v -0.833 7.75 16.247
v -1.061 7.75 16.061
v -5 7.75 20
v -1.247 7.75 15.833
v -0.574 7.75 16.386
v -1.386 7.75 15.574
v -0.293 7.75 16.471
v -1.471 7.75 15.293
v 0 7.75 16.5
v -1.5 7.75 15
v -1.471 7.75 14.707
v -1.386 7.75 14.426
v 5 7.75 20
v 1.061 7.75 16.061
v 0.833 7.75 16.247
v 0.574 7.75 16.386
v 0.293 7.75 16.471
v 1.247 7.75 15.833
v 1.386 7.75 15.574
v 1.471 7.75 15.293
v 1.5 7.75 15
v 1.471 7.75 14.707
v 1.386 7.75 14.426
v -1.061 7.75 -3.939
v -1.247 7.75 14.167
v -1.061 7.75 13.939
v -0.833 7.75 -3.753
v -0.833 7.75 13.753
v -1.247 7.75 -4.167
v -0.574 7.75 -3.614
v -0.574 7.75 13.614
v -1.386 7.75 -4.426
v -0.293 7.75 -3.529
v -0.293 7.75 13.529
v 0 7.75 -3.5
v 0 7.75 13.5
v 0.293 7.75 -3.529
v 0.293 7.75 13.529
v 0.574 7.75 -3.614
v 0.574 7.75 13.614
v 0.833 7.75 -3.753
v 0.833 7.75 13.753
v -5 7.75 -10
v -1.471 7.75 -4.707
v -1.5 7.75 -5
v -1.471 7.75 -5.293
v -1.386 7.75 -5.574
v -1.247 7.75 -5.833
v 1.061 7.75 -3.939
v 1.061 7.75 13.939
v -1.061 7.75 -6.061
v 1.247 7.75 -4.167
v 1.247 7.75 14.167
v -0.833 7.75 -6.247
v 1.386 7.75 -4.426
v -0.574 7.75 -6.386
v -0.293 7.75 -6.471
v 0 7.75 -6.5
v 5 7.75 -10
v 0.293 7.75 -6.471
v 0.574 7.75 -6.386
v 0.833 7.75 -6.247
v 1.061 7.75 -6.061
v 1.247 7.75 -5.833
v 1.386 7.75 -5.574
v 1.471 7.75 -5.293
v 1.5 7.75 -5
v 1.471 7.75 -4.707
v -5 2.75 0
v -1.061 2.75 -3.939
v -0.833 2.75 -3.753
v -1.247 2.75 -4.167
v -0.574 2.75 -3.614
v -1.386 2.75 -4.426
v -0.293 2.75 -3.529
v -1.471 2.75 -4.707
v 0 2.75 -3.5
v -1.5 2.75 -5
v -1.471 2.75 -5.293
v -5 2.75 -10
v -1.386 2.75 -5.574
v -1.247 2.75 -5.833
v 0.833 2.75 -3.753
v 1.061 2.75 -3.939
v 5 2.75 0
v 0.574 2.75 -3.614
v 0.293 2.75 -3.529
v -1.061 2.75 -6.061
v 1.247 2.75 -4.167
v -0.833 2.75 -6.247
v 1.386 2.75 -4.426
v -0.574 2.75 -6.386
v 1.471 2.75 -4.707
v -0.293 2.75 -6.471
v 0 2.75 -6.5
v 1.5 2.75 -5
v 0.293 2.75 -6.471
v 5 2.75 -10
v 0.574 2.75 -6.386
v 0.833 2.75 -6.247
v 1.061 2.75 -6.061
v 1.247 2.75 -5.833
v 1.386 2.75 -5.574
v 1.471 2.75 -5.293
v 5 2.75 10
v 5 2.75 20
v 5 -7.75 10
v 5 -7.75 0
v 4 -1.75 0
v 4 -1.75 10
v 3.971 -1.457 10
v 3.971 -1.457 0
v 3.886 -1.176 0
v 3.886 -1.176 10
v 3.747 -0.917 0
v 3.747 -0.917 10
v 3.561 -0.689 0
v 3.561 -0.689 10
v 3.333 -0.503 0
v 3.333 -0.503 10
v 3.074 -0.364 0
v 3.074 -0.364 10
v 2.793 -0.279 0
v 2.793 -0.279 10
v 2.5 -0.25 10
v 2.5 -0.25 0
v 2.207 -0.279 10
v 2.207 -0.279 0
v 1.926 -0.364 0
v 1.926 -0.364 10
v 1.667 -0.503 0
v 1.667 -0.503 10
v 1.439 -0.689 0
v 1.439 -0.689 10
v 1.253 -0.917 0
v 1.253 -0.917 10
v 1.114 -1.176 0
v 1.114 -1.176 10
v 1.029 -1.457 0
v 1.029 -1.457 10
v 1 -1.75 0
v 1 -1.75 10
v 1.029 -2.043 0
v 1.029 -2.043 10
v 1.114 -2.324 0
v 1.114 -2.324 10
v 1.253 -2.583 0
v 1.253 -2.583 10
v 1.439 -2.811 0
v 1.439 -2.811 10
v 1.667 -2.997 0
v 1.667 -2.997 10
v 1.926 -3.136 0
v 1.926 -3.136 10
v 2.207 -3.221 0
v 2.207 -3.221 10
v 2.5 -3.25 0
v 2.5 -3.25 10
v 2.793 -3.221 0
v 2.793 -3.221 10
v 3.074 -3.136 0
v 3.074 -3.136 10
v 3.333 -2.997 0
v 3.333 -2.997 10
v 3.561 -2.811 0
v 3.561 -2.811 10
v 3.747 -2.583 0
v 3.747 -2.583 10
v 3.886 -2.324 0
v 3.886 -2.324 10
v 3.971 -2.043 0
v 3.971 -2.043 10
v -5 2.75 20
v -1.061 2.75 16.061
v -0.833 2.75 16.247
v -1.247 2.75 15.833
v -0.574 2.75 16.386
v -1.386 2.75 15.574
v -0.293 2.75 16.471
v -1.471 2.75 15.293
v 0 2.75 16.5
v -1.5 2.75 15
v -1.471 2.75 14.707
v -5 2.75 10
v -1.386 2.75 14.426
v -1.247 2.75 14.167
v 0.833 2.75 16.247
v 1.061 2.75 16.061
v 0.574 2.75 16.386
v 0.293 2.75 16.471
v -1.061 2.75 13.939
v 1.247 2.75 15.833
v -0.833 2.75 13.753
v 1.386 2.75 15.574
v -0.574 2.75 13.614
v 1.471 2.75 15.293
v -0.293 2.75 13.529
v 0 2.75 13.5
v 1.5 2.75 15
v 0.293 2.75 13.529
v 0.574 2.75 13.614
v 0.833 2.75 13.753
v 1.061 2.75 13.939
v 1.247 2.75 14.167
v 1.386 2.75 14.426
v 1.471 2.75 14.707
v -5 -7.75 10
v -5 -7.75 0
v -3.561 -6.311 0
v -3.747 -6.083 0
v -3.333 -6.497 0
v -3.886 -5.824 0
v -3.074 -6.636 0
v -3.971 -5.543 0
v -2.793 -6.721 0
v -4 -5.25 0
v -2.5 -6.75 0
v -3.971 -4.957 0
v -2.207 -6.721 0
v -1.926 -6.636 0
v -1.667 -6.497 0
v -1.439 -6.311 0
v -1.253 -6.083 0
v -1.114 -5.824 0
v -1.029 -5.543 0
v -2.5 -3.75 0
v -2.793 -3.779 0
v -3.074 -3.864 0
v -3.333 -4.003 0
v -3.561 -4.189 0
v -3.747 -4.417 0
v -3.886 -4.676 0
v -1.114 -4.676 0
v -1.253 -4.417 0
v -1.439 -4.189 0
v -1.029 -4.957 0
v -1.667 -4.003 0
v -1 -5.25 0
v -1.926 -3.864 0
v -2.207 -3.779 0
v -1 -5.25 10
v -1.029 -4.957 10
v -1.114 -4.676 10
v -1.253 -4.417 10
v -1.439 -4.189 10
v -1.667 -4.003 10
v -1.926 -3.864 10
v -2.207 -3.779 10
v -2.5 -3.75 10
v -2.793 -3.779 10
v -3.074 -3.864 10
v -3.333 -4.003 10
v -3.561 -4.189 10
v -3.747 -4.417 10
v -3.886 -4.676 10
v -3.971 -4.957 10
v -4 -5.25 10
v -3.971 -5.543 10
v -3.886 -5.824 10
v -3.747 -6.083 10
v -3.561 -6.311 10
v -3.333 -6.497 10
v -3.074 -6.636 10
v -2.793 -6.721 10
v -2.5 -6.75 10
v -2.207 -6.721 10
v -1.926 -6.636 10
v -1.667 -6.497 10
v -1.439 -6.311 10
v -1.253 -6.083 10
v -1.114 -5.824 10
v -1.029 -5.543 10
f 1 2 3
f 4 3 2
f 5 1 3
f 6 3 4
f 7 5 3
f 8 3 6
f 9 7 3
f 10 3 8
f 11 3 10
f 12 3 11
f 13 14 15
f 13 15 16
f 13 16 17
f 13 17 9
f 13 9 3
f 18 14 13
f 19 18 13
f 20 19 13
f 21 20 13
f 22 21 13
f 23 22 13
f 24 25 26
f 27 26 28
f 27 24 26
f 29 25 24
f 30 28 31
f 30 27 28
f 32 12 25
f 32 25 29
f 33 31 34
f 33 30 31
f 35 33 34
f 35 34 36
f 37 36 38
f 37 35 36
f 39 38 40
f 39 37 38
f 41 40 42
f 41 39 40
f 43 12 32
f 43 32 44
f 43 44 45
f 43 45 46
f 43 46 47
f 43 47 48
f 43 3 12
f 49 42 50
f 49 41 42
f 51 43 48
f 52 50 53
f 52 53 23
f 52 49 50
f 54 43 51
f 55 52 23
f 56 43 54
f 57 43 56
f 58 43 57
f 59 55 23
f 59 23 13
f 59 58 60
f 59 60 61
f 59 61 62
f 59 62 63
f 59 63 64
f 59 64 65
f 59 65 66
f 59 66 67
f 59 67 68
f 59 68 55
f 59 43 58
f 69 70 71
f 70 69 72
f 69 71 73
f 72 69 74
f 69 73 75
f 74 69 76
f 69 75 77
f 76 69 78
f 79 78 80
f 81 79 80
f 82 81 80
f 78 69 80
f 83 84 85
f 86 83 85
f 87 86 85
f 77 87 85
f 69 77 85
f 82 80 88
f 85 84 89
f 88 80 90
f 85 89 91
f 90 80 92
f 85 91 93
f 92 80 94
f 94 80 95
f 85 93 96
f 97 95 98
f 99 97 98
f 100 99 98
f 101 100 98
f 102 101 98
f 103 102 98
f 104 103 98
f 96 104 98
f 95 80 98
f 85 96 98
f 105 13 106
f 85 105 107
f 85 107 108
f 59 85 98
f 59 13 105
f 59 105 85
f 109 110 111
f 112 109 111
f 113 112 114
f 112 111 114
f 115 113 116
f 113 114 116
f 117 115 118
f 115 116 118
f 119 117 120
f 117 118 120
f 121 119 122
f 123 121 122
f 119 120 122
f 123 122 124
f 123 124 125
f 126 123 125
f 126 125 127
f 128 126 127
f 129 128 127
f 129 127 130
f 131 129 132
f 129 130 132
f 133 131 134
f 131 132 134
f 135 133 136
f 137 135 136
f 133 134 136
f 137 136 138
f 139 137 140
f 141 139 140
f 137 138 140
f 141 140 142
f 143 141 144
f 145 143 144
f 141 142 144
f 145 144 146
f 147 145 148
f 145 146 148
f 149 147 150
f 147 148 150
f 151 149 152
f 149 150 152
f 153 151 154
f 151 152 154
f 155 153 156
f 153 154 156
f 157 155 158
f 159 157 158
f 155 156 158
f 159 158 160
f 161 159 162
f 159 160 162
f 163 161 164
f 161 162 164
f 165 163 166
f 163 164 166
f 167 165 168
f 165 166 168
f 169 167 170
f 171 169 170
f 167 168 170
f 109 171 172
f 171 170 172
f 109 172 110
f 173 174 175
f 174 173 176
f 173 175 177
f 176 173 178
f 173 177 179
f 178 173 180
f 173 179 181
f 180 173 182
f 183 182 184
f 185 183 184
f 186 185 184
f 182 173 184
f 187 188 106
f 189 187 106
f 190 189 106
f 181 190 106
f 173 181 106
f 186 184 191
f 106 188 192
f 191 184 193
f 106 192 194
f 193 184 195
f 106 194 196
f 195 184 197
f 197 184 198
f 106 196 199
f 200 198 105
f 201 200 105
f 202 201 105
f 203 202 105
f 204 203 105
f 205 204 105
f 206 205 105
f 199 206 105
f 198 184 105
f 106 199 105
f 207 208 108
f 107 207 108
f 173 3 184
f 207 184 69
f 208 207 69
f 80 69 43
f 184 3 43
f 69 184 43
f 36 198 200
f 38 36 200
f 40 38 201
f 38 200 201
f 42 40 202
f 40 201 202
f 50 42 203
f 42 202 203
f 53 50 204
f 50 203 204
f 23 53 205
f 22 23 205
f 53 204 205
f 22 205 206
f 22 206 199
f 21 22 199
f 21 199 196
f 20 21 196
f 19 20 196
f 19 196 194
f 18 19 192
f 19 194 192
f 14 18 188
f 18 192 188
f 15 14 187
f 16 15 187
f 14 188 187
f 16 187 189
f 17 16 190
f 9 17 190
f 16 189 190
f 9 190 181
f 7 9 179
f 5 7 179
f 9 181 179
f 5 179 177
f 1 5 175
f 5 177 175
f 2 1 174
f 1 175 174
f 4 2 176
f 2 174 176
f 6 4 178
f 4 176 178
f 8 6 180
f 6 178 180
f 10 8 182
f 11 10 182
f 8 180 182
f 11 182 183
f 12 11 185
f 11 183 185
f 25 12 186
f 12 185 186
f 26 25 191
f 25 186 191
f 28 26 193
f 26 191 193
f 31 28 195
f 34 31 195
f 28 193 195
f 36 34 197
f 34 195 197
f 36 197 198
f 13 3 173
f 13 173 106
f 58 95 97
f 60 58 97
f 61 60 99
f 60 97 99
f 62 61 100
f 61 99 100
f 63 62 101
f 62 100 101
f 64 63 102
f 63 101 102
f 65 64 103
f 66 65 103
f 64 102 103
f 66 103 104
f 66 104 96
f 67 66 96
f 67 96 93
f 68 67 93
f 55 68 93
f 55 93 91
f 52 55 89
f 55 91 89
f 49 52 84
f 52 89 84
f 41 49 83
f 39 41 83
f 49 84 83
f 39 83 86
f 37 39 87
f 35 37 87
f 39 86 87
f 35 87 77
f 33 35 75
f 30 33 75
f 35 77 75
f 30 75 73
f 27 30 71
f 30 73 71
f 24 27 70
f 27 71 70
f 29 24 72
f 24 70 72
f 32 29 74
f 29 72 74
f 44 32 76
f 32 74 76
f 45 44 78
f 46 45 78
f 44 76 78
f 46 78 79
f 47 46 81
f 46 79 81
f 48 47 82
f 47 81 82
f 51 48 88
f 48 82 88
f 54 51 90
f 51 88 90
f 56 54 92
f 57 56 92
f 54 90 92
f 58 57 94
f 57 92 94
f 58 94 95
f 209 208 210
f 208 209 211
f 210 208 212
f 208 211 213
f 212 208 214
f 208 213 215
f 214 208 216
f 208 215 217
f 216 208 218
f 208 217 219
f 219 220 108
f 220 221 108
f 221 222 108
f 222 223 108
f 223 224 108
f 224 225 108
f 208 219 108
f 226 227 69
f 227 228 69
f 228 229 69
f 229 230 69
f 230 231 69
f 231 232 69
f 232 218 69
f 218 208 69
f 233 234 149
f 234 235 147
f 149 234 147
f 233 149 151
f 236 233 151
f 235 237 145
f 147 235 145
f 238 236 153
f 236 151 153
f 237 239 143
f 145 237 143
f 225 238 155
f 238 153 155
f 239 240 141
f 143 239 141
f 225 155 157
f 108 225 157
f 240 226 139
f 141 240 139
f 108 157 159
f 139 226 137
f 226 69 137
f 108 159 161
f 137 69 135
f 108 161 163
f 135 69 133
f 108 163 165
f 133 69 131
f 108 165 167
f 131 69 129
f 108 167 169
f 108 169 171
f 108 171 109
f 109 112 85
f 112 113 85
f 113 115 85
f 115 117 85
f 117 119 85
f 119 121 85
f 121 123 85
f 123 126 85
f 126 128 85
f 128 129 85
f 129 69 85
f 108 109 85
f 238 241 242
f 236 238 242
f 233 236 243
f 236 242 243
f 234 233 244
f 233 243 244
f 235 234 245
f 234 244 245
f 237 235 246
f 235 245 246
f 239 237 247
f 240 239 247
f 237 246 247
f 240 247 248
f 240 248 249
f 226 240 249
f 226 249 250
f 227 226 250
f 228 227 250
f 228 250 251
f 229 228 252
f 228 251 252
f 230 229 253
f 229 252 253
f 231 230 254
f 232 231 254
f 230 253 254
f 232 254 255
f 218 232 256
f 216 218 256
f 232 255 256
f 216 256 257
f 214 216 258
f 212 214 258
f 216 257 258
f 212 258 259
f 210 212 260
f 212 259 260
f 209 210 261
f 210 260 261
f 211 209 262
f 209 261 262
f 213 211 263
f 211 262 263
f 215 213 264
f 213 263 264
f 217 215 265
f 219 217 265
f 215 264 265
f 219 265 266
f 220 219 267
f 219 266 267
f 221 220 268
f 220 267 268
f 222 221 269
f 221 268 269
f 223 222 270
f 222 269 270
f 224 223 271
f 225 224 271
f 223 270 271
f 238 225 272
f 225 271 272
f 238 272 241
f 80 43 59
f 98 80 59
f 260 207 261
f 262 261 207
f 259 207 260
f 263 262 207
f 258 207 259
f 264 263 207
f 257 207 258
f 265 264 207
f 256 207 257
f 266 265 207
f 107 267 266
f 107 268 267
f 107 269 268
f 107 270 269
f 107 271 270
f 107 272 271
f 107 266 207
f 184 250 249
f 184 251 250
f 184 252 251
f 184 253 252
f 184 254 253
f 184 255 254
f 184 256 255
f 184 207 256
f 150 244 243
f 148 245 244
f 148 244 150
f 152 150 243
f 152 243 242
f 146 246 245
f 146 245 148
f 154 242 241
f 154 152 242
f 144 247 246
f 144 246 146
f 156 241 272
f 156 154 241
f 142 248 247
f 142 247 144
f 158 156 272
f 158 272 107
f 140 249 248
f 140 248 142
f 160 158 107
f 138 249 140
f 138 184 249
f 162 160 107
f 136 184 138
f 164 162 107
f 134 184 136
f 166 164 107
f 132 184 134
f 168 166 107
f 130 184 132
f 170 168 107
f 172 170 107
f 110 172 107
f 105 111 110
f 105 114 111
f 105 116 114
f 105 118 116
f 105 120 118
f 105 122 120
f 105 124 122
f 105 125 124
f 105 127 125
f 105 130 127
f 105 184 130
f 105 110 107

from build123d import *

# Parameters (mm, degrees)
SKETCH_1_W          = 10
SKETCH_1_H          = 15.5
EXTRUDE_1_DEPTH     = 10
SKETCH_2_W          = 10
SKETCH_2_H          = 10
EXTRUDE_2_DEPTH     = 5
SKETCH_3_R          = 1.5
CUT_EXTRUDE_1_DEPTH = 5
SKETCH_4_R          = 1.5
CUT_EXTRUDE_2_DEPTH = 10


with BuildPart() as part:
    # 草图1 → 凸台-拉伸1 (new body)
    with BuildSketch(Plane.XY):
        Rectangle(SKETCH_1_W, SKETCH_1_H)
    extrude(amount=EXTRUDE_1_DEPTH)

    # 草图2 → 凸台-拉伸2 (add)
    with BuildSketch(Plane(origin=(0, 7.75, 0), x_dir=(1, 0, 0), z_dir=(0, 1, 0))):
        with Locations((0, -15)):
            Rectangle(SKETCH_2_W, SKETCH_2_H)
        with Locations((0, 5)):
            Rectangle(SKETCH_2_W, SKETCH_2_H)
    extrude(amount=-EXTRUDE_2_DEPTH)

    # 草图3 → 切除-拉伸1 (cut)
    with BuildSketch(Plane.XZ.offset(-2.75)):
        with Locations(Location((0, -5, 0), (0, 0, 270))):
            Circle(SKETCH_3_R)
        with Locations(Location((0, 15, 0), (0, 0, 270))):
            Circle(SKETCH_3_R)
    extrude(amount=-CUT_EXTRUDE_1_DEPTH, mode=Mode.SUBTRACT)

    # 草图4 → 切除-拉伸2 (cut)
    with BuildSketch(Plane.XY.offset(10)):
        with Locations((-2.5, -5.25)):
            Circle(SKETCH_4_R)
        with Locations((2.5, -1.75)):
            Circle(SKETCH_4_R)
    extrude(amount=-CUT_EXTRUDE_2_DEPTH, mode=Mode.SUBTRACT)


solid = part.part
